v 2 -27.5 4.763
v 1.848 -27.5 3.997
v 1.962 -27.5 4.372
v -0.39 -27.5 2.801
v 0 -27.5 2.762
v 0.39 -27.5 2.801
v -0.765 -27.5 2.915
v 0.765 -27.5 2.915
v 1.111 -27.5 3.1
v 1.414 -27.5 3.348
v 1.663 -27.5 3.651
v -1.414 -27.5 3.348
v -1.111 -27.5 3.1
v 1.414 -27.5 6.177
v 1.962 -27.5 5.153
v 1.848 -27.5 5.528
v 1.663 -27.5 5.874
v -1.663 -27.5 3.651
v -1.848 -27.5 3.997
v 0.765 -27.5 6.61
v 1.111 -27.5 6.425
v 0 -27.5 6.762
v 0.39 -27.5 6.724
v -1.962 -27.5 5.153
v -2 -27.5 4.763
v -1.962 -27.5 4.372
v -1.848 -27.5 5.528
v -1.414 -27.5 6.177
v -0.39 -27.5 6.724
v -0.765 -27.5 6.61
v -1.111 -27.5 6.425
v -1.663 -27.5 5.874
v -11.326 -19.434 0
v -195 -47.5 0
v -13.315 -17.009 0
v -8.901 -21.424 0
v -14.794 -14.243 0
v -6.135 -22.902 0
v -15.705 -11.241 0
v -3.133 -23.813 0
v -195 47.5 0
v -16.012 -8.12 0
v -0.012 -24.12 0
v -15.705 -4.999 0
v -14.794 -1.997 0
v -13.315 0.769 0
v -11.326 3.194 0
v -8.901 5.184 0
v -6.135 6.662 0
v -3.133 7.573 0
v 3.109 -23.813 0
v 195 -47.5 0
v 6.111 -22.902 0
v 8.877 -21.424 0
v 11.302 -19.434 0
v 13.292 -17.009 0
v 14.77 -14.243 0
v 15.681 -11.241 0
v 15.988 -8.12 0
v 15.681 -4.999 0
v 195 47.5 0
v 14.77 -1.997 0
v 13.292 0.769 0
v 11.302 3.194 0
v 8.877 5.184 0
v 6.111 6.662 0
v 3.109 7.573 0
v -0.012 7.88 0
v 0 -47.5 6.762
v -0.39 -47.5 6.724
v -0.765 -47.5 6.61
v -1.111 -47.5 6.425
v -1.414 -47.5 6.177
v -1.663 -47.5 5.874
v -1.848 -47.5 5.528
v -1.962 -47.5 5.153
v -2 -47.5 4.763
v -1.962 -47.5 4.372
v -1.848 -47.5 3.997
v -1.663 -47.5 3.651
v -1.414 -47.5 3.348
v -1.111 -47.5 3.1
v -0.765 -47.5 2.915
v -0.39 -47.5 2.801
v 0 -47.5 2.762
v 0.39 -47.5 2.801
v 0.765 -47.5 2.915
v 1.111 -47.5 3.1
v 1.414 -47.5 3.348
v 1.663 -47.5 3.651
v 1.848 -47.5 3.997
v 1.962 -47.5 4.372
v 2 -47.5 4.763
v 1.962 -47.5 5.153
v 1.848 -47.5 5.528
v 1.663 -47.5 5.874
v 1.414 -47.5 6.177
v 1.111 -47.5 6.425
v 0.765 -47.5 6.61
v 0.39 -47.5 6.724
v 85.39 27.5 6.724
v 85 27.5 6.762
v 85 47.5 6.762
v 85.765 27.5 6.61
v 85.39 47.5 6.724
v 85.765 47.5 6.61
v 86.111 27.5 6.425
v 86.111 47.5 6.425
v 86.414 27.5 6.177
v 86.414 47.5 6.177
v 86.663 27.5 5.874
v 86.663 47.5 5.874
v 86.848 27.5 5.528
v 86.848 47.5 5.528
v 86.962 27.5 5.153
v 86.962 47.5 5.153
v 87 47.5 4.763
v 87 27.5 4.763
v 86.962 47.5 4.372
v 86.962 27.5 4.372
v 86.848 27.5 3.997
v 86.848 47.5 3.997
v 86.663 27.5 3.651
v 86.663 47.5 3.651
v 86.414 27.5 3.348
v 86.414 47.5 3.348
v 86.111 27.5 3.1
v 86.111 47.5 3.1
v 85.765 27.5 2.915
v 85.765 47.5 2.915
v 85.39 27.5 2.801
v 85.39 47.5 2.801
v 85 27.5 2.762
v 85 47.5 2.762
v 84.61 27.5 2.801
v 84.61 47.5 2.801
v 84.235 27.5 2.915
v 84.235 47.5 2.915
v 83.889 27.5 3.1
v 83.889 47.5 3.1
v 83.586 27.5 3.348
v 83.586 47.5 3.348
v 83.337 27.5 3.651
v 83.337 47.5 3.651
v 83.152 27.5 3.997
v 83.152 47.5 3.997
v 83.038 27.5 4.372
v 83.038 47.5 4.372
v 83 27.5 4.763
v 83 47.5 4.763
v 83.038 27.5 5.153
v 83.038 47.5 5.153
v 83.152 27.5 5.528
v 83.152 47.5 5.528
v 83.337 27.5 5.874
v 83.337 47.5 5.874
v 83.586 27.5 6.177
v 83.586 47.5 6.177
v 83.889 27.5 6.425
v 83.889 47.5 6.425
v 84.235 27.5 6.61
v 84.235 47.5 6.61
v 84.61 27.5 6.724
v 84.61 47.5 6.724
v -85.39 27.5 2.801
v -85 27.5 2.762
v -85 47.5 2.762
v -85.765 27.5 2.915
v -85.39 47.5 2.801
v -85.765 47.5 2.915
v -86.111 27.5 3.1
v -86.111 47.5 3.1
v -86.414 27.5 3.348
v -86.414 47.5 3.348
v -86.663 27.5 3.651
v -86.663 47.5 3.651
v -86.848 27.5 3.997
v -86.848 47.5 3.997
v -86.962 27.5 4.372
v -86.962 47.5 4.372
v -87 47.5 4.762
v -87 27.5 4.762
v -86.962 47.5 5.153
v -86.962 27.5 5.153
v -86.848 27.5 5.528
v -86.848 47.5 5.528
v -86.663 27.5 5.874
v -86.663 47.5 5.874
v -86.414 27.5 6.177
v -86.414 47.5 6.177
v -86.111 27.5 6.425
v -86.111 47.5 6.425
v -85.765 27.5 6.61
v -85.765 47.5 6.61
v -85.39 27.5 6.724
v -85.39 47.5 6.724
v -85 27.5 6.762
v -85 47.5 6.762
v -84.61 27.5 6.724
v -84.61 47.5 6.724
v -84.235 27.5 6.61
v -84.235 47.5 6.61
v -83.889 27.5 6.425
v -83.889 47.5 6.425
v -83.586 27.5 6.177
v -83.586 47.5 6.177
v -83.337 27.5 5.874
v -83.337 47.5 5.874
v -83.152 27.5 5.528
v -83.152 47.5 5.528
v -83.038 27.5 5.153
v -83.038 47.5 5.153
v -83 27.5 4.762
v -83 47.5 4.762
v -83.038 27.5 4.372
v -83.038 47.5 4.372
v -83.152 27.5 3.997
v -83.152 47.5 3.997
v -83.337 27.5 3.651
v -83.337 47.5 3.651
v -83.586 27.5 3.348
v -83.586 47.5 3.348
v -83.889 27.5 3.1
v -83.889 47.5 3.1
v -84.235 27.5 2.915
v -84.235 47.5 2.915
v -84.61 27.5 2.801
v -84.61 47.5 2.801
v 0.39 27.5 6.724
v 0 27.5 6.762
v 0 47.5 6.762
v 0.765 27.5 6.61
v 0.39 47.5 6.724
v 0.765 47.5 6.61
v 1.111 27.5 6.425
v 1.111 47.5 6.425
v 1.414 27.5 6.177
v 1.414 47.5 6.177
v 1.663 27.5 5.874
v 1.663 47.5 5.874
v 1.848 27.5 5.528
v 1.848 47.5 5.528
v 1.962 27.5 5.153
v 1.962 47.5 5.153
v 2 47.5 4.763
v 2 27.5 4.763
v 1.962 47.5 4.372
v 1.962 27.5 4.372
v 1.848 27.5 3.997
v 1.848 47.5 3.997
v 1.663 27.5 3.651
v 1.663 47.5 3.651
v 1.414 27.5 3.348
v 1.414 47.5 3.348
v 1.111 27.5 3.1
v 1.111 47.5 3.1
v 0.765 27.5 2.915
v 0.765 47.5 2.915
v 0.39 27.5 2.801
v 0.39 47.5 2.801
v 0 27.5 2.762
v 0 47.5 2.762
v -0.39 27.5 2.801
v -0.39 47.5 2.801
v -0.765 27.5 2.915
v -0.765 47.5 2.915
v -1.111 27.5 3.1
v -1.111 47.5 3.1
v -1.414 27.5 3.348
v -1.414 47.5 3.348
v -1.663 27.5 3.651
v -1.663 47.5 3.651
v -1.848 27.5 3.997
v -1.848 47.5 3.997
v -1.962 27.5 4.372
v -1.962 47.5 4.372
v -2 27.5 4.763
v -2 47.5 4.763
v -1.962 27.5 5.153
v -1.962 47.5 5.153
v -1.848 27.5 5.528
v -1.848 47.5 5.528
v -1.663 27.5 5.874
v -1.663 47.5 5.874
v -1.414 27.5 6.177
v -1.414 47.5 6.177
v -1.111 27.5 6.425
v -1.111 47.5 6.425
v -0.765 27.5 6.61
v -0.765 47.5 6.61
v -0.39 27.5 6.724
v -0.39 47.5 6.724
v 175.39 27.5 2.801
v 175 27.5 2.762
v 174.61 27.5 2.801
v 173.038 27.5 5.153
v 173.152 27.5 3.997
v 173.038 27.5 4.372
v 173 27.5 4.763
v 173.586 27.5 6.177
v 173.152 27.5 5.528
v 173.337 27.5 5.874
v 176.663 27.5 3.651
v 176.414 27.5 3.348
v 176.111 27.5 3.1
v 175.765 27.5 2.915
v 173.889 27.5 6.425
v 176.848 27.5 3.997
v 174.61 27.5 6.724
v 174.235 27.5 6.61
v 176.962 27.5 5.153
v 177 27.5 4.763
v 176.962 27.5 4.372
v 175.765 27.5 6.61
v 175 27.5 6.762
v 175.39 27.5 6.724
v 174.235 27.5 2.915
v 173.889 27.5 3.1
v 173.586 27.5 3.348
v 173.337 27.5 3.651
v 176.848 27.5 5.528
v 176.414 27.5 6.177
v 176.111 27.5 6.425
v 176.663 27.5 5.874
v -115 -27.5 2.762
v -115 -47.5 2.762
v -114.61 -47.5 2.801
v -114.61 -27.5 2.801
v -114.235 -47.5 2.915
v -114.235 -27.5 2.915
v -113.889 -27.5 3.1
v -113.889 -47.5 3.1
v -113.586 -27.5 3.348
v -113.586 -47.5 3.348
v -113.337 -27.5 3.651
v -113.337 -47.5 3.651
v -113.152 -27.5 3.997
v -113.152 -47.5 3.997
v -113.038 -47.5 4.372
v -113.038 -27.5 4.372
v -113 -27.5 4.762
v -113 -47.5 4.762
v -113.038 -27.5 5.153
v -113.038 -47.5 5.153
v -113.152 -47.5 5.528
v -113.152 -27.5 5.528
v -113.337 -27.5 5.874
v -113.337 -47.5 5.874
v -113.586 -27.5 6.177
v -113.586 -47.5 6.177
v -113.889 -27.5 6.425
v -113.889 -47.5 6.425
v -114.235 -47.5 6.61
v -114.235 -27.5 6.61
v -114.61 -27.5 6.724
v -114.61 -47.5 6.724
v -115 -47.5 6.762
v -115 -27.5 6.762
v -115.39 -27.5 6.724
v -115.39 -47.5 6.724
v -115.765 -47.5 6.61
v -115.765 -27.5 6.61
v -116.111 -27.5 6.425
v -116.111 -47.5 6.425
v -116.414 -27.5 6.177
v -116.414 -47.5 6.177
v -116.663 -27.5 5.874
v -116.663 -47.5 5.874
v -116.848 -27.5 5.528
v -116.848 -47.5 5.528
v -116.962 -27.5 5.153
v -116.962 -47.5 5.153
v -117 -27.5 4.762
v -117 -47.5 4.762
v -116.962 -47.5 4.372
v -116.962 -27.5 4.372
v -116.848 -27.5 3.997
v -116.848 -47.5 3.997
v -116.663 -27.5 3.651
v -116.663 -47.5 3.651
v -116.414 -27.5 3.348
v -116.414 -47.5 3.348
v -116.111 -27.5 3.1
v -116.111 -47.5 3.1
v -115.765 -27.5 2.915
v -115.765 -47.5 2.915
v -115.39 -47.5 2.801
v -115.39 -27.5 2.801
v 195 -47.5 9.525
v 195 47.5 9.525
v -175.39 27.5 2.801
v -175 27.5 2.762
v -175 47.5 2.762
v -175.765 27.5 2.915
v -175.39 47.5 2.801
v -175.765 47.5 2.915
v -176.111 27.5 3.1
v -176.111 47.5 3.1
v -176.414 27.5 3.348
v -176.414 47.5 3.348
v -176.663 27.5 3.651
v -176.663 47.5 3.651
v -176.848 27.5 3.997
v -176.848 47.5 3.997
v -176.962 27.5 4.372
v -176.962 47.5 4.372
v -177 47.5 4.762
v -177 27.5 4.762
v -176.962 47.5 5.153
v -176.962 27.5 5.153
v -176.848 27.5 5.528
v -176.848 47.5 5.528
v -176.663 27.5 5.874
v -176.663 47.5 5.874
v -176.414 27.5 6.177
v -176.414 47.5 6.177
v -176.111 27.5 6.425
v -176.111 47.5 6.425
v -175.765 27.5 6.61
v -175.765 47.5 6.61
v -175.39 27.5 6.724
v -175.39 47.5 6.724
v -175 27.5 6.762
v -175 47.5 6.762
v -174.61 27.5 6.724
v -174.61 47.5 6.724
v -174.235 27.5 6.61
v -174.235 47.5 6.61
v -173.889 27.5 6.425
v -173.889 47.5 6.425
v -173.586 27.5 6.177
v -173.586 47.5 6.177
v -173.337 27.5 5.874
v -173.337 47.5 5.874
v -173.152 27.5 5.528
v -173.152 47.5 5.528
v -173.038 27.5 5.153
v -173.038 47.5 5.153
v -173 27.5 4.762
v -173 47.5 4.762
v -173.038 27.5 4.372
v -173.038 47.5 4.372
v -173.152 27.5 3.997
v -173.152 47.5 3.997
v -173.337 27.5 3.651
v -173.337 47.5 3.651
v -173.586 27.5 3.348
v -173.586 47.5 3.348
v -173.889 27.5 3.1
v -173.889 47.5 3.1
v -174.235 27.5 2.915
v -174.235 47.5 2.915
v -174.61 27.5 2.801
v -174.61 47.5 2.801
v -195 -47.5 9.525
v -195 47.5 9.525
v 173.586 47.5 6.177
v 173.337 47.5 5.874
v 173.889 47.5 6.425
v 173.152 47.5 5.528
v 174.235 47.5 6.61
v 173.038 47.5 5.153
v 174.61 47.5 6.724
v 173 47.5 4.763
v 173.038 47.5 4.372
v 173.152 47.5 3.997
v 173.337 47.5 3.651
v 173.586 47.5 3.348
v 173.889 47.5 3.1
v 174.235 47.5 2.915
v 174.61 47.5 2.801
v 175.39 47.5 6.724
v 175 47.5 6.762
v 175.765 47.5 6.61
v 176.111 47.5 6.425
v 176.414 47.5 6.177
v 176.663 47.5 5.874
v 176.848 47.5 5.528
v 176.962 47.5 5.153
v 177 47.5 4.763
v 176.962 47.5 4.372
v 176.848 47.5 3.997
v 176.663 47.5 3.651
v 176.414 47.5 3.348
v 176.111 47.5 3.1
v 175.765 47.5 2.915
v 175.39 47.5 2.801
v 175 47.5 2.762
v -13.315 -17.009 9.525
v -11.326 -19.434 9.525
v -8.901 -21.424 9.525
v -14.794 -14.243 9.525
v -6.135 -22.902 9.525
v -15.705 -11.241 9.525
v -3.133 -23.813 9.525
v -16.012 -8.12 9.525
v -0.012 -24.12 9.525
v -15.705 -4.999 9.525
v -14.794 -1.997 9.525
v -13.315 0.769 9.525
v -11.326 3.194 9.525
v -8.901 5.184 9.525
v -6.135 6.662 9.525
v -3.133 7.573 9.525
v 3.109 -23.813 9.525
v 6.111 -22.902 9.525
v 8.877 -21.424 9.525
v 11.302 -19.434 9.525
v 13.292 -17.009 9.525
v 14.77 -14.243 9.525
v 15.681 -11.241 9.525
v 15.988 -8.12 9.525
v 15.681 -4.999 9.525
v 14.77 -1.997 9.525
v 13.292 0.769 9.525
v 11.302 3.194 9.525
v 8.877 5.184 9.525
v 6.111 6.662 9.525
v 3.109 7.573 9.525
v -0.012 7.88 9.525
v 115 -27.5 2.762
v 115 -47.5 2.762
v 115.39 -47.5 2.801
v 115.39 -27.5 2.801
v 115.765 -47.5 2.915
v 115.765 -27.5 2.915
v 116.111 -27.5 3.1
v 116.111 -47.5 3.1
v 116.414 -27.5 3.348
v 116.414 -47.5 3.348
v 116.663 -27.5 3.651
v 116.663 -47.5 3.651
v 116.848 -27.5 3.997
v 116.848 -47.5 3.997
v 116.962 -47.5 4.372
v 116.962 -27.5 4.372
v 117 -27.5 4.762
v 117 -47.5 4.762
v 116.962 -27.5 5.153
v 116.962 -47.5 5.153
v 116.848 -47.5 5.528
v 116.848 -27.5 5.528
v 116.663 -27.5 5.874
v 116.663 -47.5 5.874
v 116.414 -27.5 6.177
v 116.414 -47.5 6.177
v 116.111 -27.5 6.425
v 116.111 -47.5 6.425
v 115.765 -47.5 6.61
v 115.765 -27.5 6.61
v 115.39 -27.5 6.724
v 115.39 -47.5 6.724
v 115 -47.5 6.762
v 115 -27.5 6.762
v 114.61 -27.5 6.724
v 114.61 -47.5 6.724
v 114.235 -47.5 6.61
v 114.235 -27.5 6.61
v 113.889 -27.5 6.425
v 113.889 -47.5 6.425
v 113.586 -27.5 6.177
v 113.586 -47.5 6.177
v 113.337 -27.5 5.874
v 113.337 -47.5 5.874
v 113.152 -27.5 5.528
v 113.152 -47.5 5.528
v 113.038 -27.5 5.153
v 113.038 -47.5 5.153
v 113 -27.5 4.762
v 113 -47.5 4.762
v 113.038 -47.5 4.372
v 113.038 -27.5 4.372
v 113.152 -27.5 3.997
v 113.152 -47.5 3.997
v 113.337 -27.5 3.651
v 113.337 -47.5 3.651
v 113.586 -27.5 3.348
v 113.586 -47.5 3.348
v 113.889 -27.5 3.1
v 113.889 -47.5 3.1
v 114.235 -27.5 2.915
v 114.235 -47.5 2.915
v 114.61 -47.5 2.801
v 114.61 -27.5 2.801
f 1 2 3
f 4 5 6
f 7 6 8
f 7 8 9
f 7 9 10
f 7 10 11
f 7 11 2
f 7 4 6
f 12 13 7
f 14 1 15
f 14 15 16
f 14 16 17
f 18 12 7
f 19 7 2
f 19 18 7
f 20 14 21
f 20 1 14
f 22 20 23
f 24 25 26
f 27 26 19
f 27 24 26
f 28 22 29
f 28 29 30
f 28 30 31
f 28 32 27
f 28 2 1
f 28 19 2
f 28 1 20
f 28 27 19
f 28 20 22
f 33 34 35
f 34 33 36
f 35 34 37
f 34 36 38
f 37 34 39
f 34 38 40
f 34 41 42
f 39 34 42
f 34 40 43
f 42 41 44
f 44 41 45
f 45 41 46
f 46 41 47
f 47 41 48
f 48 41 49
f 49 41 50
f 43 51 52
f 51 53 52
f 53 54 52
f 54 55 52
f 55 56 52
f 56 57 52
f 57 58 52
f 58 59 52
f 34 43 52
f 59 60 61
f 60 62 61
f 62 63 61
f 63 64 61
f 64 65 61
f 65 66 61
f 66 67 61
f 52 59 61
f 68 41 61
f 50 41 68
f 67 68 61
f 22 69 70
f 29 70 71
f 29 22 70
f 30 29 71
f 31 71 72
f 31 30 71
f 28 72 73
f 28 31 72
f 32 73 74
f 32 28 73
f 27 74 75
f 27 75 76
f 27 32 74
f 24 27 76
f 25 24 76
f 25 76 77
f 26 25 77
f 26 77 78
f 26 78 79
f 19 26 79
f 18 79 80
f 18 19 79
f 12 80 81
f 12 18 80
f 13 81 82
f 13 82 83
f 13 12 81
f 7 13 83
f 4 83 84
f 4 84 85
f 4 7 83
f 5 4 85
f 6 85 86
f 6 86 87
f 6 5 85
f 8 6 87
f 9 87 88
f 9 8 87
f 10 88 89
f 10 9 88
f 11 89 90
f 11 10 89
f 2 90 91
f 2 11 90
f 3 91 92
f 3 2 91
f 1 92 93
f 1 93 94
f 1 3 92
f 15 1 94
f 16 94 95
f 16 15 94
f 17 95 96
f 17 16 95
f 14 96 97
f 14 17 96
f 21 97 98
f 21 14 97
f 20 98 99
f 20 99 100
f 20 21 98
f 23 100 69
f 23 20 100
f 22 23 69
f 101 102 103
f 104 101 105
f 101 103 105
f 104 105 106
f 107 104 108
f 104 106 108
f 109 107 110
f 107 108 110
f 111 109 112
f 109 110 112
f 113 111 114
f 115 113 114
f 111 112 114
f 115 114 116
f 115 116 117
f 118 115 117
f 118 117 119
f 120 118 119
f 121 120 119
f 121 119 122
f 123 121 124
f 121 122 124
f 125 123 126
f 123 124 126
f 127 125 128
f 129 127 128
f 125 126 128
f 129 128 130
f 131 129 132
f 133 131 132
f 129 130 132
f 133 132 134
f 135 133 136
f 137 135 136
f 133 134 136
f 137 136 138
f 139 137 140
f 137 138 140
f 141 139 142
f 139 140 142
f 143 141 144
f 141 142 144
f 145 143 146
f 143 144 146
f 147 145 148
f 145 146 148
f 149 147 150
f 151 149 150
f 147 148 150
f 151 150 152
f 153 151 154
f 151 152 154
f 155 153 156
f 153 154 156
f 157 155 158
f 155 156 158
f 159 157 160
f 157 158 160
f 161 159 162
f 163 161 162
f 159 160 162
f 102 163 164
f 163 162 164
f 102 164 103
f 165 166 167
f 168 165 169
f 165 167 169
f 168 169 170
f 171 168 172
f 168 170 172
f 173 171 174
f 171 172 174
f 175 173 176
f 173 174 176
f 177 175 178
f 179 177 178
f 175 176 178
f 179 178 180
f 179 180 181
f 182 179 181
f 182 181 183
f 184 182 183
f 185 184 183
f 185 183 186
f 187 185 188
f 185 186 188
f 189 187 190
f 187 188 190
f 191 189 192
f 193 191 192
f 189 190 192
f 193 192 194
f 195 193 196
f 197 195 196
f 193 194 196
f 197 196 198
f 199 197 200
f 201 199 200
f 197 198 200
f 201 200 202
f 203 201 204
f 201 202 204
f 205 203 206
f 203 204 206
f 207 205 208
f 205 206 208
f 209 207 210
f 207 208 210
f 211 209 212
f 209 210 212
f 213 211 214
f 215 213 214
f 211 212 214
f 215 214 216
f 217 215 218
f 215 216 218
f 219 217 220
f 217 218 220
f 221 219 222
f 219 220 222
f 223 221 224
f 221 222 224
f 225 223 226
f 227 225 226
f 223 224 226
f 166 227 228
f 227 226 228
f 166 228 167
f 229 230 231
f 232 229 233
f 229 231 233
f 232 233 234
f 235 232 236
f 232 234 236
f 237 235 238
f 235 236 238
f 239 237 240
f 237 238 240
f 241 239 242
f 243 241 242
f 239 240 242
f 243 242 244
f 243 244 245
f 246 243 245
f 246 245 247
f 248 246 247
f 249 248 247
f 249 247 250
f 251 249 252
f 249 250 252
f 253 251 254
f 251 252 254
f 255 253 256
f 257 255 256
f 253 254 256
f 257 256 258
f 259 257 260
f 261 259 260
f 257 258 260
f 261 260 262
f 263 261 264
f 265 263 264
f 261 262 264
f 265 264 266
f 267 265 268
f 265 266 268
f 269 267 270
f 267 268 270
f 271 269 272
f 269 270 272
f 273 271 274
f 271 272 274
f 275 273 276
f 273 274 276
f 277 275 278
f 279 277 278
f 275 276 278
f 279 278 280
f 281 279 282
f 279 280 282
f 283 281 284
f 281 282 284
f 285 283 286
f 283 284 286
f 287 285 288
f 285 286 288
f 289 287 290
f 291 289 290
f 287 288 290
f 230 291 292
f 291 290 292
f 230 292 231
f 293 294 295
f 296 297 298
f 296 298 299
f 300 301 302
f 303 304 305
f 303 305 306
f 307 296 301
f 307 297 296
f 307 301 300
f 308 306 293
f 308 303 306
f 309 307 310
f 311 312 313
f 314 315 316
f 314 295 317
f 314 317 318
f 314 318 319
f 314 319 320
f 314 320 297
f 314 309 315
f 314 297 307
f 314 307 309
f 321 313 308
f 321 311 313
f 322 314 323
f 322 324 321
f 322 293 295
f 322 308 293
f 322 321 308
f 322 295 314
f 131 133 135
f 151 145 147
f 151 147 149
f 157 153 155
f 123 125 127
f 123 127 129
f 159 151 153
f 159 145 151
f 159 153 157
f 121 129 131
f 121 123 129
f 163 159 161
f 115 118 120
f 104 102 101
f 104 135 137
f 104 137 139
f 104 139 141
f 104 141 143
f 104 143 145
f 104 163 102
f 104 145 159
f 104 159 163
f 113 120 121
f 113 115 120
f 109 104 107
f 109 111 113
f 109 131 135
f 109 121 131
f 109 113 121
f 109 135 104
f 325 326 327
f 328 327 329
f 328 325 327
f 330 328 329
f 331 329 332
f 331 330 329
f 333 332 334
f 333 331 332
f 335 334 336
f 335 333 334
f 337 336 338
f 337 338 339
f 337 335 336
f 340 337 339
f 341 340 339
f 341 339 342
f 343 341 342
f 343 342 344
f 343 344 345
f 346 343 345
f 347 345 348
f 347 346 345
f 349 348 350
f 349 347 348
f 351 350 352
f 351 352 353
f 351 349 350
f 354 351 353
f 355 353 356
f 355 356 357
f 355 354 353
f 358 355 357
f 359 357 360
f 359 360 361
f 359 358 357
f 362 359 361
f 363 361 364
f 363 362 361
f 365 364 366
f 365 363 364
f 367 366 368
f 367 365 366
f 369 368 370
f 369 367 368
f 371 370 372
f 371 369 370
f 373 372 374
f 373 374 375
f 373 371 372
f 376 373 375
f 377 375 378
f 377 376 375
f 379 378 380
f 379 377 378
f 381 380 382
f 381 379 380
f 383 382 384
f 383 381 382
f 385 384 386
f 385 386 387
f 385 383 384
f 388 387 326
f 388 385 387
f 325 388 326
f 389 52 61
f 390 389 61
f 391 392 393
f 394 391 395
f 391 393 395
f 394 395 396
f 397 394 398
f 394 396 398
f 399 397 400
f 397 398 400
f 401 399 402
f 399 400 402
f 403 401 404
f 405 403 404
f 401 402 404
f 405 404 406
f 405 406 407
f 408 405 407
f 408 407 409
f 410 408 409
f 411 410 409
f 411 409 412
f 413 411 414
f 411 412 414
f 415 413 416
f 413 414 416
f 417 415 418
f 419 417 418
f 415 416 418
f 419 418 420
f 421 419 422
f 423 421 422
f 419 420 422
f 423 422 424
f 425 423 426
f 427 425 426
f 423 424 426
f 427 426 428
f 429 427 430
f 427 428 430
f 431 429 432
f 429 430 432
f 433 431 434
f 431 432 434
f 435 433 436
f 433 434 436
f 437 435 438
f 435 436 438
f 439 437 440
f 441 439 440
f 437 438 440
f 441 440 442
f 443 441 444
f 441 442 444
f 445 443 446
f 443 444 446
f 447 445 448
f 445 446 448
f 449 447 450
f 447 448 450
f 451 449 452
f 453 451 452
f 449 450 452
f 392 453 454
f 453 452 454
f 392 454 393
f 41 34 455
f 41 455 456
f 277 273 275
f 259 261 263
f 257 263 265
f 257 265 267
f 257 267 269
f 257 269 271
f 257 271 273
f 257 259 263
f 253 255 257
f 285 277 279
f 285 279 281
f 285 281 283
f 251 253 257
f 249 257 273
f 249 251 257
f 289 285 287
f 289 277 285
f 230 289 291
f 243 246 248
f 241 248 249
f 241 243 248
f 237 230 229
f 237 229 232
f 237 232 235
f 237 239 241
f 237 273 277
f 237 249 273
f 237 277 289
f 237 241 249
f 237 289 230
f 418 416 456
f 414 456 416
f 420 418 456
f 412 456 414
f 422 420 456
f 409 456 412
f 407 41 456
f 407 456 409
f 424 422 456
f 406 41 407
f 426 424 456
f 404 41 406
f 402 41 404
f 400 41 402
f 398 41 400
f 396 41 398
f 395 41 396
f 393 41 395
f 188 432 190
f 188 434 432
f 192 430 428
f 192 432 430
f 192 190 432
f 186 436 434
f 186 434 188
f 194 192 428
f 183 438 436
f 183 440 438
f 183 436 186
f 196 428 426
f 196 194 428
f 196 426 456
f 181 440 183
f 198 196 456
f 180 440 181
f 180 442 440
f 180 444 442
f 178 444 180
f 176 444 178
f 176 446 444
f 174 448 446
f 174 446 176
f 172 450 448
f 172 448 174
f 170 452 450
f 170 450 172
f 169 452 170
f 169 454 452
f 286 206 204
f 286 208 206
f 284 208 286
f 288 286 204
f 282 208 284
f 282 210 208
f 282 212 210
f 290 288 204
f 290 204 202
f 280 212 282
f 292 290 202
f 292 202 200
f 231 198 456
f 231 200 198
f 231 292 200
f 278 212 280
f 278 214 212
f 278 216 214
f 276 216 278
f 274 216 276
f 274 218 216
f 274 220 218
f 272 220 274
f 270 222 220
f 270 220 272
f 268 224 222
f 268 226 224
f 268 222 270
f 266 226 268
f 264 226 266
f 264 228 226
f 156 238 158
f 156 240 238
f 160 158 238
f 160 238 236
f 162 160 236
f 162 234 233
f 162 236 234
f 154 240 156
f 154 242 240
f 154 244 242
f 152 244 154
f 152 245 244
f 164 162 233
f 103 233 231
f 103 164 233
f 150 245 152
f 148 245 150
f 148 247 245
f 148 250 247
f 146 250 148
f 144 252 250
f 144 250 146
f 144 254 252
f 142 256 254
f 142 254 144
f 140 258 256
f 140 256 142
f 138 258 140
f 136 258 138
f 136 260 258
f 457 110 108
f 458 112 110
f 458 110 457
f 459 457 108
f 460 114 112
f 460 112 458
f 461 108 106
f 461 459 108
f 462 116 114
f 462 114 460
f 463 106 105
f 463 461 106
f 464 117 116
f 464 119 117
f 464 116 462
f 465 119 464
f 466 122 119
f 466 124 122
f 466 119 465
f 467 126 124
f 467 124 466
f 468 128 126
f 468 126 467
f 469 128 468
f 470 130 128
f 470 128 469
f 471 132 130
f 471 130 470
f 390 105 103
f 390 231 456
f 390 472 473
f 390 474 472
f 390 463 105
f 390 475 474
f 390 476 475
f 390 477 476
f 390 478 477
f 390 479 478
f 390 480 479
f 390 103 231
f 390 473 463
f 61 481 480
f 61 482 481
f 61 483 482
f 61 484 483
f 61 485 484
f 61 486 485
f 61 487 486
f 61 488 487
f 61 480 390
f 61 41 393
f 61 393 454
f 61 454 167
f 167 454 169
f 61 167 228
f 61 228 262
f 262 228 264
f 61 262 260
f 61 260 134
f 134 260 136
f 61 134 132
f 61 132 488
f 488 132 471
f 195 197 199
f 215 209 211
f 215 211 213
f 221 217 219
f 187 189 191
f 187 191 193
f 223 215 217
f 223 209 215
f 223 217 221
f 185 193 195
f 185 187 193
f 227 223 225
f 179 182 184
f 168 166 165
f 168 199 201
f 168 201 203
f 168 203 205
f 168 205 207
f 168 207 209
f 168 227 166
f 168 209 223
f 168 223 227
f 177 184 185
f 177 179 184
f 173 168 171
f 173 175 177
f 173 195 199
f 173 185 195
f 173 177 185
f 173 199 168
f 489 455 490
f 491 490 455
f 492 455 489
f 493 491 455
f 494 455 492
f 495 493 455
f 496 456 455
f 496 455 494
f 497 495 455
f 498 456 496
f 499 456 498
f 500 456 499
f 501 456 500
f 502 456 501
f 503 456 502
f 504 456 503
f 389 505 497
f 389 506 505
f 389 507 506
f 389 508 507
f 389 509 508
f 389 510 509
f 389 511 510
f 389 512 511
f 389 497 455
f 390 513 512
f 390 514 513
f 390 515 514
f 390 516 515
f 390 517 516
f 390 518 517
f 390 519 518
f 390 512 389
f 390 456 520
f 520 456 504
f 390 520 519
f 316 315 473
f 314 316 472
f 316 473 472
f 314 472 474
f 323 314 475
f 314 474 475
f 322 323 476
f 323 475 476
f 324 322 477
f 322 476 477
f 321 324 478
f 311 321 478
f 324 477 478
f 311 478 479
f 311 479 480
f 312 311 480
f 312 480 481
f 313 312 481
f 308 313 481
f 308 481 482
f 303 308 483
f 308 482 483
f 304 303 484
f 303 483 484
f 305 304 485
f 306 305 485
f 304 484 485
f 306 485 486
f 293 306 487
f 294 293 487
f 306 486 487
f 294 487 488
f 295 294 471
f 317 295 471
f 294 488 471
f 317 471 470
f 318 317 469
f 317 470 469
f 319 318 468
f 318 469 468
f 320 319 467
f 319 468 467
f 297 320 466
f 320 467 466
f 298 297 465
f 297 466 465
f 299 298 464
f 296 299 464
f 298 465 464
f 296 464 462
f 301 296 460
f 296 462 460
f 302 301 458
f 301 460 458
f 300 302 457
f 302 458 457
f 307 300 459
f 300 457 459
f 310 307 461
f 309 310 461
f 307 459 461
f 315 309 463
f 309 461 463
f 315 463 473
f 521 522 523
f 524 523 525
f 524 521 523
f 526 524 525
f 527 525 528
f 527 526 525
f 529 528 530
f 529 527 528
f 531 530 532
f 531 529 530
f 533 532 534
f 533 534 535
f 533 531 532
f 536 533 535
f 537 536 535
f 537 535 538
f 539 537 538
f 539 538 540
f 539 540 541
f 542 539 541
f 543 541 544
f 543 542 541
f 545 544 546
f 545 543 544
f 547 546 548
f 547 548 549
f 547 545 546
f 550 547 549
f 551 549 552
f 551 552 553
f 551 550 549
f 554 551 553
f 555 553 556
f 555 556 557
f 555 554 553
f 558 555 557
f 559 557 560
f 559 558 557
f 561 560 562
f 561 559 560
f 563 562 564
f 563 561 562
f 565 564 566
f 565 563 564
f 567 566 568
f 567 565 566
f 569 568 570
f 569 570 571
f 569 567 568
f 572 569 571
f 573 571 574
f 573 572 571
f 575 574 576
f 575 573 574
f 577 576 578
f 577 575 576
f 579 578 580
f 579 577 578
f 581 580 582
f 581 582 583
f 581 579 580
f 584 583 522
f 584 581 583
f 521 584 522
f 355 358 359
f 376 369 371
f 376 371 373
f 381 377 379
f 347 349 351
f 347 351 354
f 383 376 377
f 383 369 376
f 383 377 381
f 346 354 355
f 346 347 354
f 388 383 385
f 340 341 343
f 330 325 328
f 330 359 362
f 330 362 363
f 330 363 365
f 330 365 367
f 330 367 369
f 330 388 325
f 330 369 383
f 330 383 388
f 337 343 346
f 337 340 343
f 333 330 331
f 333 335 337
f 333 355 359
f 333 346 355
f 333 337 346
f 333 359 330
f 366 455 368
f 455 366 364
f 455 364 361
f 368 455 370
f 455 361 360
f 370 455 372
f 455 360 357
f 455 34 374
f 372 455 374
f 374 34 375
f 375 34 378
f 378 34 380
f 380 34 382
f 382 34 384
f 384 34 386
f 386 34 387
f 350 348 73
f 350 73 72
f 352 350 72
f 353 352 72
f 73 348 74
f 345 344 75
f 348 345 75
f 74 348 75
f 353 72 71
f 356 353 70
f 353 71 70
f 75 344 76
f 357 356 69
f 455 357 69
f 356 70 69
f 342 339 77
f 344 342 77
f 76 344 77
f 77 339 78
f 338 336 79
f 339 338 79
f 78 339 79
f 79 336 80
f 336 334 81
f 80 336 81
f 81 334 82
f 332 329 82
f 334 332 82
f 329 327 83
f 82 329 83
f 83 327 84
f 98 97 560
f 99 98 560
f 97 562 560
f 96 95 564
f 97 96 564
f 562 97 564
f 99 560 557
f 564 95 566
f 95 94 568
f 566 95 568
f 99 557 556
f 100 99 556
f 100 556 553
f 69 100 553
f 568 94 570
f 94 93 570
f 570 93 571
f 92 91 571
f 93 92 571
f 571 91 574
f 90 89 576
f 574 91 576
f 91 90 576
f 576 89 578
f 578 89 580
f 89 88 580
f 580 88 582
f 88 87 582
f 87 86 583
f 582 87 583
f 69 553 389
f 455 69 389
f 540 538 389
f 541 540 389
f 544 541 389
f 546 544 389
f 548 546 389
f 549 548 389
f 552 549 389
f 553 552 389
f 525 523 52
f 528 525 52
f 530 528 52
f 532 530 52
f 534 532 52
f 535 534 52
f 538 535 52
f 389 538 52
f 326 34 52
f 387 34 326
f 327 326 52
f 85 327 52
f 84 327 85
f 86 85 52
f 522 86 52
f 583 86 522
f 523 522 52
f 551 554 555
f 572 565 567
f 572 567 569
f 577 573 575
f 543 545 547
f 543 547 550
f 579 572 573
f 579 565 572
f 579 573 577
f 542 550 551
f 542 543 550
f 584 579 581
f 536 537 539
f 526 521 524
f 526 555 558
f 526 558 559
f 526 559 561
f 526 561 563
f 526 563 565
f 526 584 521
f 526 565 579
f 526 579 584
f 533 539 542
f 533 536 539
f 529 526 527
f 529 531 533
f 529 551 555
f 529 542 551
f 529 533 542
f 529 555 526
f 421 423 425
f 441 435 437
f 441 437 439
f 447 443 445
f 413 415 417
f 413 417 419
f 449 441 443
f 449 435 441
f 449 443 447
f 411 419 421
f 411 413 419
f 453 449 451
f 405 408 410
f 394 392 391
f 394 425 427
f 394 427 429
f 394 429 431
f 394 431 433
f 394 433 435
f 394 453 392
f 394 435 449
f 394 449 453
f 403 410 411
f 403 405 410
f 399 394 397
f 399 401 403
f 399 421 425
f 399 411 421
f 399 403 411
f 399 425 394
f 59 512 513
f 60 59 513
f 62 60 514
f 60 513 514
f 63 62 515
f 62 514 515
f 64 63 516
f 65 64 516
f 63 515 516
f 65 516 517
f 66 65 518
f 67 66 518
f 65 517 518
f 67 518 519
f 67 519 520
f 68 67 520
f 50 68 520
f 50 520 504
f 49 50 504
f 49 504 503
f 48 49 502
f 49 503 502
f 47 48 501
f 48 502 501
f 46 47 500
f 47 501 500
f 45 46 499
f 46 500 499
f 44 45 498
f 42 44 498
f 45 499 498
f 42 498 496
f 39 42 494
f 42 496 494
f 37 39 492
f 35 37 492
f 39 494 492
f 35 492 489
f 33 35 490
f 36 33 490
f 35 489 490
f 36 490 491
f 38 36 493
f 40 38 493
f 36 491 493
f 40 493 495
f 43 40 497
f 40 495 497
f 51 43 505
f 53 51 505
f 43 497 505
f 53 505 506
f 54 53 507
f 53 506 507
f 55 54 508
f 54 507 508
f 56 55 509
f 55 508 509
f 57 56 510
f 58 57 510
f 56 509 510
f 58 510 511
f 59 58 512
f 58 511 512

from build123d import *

# Parameters (mm, degrees)
ESBO_O1_W                  = 390
ESBO_O1_H                  = 95
RESSALTO_EXTRUS_O1_DEPTH   = 9.525
ESBO_O3_R                  = 16
CIRCULO_DE_ROLAMENTO_DEPTH = 9.525
ESBO_O4_R                  = 2
CORTE_EXTRUS_O3_DEPTH      = 20
CORTE_EXTRUS_O4_START      = -20
ESBO_O5_R                  = 2
CORTE_EXTRUS_O4_DEPTH      = 20


with BuildPart() as part:
    # Esboço1 → Ressalto-extrusão1 (new body)
    with BuildSketch(Plane.XY):
        Rectangle(ESBO_O1_W, ESBO_O1_H)
    extrude(amount=RESSALTO_EXTRUS_O1_DEPTH)

    # Esboço3 → Circulo de rolamento (cut)
    with BuildSketch(Plane.XY.offset(9.525)):
        with Locations((-0.011971039, -8.12)):
            Circle(ESBO_O3_R)
    extrude(amount=-CIRCULO_DE_ROLAMENTO_DEPTH, mode=Mode.SUBTRACT)

    # Esboço4 → Corte-extrusão3 (cut)
    with BuildSketch(Plane(origin=(0, 47.5, 0), x_dir=(1, 0, 0), z_dir=(0, 1, 0))):
        with Locations(Location((175, -4.7625, 0), (0, 0, 270))):
            Circle(ESBO_O4_R)
        with Locations(Location((85, -4.7625, 0), (0, 0, 270))):
            Circle(ESBO_O4_R)
        with Locations(Location((0, -4.7625, 0), (0, 0, 270))):
            Circle(ESBO_O4_R)
        with Locations(Location((-175, -4.7625, 0), (0, 0, 90))):
            Circle(ESBO_O4_R)
        with Locations(Location((-85, -4.7625, 0), (0, 0, 90))):
            Circle(ESBO_O4_R)
    extrude(amount=-CORTE_EXTRUS_O3_DEPTH, mode=Mode.SUBTRACT)

    # Esboço5 → Corte-extrusão4 (cut)
    with BuildSketch(Plane.XZ.offset(47.5).offset(CORTE_EXTRUS_O4_START)):
        with Locations(Location((0, 4.7625, 0), (0, 0, 90))):
            Circle(ESBO_O5_R)
        with Locations(Location((-115, 4.7625, 0), (0, 0, 270))):
            Circle(ESBO_O5_R)
        with Locations(Location((115, 4.7625, 0), (0, 0, 270))):
            Circle(ESBO_O5_R)
    extrude(amount=CORTE_EXTRUS_O4_DEPTH, mode=Mode.SUBTRACT)


solid = part.part
